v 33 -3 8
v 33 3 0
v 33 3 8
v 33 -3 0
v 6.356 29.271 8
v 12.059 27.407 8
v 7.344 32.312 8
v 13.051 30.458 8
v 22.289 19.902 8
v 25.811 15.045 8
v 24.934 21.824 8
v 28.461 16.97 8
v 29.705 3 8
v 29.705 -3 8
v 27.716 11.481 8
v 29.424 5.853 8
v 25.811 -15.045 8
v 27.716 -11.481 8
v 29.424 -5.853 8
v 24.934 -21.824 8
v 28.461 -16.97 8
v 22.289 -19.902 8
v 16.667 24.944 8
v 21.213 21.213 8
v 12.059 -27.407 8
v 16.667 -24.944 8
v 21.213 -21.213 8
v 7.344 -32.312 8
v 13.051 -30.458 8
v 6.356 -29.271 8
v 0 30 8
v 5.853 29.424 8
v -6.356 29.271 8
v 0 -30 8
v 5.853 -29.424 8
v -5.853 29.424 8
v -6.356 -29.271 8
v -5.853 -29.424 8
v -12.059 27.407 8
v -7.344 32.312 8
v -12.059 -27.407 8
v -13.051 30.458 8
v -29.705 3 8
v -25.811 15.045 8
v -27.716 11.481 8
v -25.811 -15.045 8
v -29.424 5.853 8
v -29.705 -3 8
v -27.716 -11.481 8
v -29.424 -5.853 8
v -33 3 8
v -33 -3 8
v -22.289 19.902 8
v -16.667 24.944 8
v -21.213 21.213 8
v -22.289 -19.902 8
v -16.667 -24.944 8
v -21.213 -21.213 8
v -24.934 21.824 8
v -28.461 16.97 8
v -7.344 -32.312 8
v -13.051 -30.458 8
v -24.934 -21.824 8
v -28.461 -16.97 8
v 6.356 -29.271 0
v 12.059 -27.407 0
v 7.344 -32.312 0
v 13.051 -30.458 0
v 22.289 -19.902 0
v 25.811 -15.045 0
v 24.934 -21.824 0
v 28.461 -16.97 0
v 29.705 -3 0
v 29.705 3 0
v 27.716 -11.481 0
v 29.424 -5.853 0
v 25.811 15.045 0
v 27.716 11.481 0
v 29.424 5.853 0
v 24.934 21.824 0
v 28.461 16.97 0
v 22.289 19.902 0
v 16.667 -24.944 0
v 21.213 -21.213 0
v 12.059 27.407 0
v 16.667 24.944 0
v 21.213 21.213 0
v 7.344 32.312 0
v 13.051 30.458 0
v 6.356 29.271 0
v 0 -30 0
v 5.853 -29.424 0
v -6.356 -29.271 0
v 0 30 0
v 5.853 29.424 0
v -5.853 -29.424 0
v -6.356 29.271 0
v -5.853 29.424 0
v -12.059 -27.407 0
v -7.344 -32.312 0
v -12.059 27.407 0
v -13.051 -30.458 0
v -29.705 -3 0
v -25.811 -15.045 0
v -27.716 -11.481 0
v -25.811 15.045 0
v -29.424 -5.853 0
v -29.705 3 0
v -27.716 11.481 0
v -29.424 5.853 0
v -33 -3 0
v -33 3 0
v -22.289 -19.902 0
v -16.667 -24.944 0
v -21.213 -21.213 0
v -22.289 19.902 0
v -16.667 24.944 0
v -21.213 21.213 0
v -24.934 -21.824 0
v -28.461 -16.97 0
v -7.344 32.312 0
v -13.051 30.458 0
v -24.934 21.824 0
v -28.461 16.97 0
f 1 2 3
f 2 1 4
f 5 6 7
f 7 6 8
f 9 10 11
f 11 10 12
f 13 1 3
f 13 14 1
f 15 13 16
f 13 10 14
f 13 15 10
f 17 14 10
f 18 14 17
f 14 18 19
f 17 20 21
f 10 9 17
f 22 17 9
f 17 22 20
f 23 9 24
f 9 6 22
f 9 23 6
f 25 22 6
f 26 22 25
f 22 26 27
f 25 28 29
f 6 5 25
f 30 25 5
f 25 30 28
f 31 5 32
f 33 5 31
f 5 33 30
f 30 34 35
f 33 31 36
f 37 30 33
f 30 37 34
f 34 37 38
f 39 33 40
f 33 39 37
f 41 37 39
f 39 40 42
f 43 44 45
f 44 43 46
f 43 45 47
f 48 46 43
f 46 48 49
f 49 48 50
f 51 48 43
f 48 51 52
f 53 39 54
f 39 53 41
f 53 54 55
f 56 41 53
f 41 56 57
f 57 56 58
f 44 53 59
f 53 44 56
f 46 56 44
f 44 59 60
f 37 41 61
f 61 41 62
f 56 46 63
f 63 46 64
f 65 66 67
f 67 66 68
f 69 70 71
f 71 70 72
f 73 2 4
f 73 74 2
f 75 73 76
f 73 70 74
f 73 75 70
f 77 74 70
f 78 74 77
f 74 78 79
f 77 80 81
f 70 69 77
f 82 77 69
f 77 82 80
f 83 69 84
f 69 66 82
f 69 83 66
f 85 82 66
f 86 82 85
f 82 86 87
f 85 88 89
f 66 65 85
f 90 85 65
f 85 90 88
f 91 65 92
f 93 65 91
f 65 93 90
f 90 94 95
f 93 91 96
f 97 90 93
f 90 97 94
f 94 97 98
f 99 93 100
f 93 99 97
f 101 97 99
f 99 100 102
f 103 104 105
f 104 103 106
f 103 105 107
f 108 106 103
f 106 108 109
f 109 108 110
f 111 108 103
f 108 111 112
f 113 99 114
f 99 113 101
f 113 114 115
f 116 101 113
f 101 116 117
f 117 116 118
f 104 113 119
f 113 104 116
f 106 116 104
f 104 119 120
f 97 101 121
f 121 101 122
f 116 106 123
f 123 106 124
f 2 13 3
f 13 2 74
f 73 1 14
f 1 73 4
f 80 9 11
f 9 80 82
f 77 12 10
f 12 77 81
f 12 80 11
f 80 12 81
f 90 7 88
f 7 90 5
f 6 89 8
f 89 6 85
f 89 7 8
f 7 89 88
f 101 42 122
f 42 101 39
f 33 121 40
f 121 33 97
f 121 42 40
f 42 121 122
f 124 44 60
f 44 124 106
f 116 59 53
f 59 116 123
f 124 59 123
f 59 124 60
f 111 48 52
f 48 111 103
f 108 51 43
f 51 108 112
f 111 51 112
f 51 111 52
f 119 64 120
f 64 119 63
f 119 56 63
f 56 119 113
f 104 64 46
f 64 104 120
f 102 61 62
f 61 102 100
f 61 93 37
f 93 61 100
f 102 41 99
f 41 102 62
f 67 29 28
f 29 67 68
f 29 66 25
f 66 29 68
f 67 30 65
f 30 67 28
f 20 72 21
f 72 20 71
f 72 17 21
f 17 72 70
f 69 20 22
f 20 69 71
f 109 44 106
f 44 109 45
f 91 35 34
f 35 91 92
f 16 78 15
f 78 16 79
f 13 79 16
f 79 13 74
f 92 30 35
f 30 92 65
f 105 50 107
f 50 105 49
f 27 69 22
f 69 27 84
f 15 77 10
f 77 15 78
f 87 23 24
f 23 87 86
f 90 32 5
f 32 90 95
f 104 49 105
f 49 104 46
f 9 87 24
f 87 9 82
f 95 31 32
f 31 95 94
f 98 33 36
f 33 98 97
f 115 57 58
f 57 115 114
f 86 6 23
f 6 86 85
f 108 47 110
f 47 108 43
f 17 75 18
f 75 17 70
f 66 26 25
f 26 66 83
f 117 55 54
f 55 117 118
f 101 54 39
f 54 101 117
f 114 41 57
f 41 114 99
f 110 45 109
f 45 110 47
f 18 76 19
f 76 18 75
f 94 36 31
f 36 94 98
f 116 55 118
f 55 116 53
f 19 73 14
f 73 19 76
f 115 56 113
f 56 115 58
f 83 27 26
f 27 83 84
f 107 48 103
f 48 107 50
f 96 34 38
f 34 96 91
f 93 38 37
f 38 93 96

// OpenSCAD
$fn = 32;

// ----------------------------------------------------------------------
// Spur blank: plain gear blank
// ----------------------------------------------------------------------

// --- parameters (mm) ---
disc_r = 30;              // blank root radius
disc_t = 8;               // blank thickness
n_teeth = 10;             // stub tooth count
tooth_w = 6;              // tooth width at the root
tooth_h = 3;              // tooth height above the root

out_r = disc_r + tooth_h;  // tip radius
bbox_x = 66.0;  // measured width over the teeth
bbox_y = 64.62;  // measured depth over the teeth

union() {
  cylinder(r = disc_r, h = disc_t);
  for (i = [0 : n_teeth - 1])
    rotate([0, 0, i * 360 / n_teeth])
      translate([disc_r - 1, -tooth_w / 2, 0])
        cube([tooth_h + 1, tooth_w, disc_t]);
}
